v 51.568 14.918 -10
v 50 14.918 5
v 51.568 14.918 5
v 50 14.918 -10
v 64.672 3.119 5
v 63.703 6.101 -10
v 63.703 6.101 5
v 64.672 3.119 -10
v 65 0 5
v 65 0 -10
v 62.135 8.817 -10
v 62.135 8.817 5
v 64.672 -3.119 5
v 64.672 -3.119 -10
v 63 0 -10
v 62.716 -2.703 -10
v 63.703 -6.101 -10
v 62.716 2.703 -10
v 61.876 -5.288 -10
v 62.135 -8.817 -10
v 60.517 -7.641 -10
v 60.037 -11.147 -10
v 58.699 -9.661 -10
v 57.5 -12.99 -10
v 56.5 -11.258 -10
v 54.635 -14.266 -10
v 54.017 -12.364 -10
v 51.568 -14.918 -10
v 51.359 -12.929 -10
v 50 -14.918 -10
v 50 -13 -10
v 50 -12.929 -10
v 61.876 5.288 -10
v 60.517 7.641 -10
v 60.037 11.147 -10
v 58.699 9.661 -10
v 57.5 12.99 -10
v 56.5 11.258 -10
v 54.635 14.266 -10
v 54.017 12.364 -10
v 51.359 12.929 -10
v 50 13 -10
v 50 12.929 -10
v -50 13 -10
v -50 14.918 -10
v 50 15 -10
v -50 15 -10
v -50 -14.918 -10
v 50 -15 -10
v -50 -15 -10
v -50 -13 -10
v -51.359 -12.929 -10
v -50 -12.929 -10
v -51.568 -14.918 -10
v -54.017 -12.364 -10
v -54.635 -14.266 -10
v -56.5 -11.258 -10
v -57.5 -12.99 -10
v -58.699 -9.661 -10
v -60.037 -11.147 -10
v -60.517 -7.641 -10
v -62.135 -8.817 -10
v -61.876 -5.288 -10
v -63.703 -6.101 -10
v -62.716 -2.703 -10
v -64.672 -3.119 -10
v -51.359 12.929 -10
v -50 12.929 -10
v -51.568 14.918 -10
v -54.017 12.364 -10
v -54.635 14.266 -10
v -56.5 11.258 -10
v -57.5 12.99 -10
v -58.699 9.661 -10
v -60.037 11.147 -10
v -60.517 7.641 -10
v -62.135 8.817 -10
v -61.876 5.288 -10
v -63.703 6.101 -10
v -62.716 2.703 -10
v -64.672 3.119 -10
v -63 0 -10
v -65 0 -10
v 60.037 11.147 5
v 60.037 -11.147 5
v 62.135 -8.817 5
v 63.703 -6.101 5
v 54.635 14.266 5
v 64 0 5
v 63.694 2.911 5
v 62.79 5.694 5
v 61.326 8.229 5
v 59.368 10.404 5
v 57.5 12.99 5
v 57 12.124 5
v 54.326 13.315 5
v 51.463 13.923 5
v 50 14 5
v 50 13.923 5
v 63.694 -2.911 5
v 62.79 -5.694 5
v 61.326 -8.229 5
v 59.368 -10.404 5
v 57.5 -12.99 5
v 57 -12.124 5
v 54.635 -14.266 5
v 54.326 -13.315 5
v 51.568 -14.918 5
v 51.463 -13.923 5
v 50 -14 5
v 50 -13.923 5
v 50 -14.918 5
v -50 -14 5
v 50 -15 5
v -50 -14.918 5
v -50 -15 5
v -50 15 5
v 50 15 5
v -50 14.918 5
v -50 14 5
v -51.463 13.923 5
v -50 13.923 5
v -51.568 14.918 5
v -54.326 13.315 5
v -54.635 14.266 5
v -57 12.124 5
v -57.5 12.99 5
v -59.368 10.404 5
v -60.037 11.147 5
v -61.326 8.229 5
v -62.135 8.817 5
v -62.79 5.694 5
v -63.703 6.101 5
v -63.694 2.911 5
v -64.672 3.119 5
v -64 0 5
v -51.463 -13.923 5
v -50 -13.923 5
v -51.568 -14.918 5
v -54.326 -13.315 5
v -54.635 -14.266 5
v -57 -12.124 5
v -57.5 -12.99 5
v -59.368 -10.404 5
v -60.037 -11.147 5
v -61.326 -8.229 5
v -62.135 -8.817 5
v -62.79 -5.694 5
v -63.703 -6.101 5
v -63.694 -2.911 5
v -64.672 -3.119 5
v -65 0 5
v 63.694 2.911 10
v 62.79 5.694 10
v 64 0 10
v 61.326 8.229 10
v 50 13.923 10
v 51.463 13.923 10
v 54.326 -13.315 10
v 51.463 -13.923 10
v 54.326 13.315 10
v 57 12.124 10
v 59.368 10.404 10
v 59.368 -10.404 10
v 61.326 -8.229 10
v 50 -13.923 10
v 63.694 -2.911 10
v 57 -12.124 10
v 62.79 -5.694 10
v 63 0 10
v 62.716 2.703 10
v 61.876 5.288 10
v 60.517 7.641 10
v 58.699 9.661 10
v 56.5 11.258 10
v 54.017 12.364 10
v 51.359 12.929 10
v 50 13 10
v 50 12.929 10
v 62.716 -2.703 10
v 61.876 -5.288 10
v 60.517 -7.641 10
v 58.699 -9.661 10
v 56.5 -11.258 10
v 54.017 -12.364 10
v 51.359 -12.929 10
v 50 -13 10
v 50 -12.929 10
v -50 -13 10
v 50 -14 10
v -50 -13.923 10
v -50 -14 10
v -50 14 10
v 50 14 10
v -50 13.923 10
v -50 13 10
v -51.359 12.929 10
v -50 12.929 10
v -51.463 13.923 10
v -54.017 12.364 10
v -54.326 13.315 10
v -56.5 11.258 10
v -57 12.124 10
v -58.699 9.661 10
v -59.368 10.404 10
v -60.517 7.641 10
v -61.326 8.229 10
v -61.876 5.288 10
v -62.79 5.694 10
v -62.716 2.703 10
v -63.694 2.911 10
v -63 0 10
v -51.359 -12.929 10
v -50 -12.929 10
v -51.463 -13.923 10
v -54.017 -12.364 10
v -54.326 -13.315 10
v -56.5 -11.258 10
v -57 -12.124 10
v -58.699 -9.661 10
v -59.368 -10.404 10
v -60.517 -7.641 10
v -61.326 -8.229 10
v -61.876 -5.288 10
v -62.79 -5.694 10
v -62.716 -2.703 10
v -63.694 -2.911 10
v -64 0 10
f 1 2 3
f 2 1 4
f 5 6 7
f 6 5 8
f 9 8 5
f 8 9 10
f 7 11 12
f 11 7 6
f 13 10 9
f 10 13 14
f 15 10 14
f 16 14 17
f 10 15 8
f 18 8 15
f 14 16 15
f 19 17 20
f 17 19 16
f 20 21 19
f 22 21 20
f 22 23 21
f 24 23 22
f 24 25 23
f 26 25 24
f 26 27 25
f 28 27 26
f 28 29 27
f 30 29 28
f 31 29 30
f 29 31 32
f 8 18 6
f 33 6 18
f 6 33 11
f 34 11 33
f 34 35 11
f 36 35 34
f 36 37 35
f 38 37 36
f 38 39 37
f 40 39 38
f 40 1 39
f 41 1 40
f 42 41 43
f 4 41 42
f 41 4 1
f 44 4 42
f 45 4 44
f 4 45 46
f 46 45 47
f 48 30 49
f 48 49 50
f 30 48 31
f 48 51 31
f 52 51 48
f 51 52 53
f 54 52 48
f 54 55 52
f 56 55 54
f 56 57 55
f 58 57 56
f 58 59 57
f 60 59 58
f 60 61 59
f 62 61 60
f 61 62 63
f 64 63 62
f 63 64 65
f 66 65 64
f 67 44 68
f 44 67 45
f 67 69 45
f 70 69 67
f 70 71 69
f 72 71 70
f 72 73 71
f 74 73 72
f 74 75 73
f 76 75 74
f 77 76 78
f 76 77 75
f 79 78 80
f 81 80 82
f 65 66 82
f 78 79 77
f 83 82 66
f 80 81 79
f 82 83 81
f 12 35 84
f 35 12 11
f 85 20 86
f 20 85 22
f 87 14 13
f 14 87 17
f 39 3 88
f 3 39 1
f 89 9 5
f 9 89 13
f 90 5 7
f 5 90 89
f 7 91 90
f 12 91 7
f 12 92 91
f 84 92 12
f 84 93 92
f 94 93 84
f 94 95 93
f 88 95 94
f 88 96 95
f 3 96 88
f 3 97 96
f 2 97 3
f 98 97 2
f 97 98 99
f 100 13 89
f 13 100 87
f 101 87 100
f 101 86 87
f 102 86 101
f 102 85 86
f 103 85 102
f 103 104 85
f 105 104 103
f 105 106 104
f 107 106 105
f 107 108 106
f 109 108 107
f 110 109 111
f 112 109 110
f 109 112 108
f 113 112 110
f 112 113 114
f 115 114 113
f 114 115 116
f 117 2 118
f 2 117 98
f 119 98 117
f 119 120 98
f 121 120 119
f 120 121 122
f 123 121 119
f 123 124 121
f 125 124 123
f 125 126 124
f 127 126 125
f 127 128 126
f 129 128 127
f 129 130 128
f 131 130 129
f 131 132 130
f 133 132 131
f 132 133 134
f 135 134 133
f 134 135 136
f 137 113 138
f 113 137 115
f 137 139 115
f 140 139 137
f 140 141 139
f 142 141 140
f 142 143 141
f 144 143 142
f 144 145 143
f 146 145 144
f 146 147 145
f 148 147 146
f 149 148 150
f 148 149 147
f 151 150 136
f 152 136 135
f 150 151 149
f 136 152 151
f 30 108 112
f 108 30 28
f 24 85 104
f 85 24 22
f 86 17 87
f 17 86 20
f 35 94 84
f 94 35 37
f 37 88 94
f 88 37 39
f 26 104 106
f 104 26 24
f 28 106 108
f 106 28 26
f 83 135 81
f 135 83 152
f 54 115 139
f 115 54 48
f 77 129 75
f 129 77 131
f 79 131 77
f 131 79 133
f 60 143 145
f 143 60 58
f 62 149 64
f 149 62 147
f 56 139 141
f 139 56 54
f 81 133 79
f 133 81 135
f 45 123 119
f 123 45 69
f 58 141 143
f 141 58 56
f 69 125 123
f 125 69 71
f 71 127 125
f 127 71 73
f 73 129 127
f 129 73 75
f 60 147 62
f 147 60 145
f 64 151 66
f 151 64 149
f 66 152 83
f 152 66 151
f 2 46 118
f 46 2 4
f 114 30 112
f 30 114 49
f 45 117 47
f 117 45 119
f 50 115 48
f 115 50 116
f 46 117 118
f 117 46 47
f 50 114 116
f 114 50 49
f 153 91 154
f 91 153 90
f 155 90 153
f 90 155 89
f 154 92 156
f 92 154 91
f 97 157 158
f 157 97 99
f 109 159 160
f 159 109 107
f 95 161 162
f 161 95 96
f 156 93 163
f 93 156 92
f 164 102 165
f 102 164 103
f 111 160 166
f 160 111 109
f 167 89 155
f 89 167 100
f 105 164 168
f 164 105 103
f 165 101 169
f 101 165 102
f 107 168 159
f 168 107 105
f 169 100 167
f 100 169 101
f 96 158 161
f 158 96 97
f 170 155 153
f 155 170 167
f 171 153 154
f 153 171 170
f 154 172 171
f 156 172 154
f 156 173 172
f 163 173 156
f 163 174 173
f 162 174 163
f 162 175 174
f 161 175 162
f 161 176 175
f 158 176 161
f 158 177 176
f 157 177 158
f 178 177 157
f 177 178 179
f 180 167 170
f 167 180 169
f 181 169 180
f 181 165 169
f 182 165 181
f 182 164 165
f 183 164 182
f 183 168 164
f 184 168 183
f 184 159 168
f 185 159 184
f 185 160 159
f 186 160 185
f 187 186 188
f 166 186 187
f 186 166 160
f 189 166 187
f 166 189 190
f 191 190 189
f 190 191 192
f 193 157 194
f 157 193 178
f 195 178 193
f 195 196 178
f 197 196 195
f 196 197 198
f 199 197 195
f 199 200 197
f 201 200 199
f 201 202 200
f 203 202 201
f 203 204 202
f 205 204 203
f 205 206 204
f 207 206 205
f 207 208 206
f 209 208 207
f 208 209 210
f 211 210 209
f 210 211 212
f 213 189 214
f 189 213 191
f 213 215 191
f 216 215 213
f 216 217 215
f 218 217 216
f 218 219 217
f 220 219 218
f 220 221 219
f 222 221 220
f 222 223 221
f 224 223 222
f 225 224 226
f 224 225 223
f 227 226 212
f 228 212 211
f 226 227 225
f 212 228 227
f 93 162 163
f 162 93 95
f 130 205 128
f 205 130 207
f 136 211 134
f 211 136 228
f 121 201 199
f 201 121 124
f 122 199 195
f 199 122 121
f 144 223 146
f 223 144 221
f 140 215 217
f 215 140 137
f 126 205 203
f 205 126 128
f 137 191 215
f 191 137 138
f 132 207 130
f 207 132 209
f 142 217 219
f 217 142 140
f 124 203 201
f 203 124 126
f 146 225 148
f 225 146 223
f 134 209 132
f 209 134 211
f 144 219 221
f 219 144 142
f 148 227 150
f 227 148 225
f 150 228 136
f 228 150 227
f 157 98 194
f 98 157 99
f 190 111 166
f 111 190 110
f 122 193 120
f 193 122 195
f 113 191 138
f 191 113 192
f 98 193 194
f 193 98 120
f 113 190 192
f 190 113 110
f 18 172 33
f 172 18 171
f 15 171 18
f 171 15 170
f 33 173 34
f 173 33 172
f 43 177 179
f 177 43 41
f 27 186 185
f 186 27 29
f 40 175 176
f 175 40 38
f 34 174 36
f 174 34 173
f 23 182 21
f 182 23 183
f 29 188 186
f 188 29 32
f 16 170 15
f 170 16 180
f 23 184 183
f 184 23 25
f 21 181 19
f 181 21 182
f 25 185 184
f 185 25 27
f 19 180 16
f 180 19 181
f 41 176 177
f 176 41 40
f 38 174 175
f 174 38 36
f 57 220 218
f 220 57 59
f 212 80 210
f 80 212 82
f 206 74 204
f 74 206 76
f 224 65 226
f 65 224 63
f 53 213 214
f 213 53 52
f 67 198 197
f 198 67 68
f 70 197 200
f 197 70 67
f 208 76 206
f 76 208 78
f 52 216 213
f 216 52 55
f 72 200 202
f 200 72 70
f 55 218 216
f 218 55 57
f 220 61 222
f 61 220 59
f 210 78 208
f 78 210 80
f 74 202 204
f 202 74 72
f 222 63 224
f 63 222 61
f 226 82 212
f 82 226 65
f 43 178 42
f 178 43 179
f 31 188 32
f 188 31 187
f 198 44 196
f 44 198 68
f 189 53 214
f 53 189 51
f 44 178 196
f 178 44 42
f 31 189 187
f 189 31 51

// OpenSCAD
// file: ../../libs/own/mirror_copy.scad
module mirror_copy(v = [1, 0, 0]) {
    children();
    mirror(v) children();
}
// main file
// part to remix https://www.thingiverse.com/thing:4148187
use <../../libs/own/mirror_copy.scad>

module runde_box(hoehe = 20, breite = 40, tiefe = 20) {
    union() {
        mirror_copy() {
            translate([breite / 2 - tiefe / 2, 0, 0]) {
                cylinder(d = tiefe, h = hoehe, center = true);
            }
        }
        cube([breite - tiefe, tiefe, hoehe], center = true);
    }
}

module fenster_adapter_anschluss(hoehe = 30, breite = 130, tiefe = 30, wandstaerke = 1, ueberlappung = 5) {
    difference() {
        union() {
            translate([0, 0, - ueberlappung / 2]) {
                runde_box(hoehe = hoehe - ueberlappung, breite = breite, tiefe = tiefe);
            }
            runde_box(hoehe = hoehe, breite = breite - wandstaerke * 2, tiefe = tiefe - wandstaerke * 2);
        }
        translate([0, 0, 0]) {
            runde_box(hoehe = hoehe + ueberlappung * 2, breite = breite - wandstaerke * 4, tiefe = tiefe - wandstaerke * 4);
        }
    }
}

fenster_adapter_anschluss(hoehe = 20);
